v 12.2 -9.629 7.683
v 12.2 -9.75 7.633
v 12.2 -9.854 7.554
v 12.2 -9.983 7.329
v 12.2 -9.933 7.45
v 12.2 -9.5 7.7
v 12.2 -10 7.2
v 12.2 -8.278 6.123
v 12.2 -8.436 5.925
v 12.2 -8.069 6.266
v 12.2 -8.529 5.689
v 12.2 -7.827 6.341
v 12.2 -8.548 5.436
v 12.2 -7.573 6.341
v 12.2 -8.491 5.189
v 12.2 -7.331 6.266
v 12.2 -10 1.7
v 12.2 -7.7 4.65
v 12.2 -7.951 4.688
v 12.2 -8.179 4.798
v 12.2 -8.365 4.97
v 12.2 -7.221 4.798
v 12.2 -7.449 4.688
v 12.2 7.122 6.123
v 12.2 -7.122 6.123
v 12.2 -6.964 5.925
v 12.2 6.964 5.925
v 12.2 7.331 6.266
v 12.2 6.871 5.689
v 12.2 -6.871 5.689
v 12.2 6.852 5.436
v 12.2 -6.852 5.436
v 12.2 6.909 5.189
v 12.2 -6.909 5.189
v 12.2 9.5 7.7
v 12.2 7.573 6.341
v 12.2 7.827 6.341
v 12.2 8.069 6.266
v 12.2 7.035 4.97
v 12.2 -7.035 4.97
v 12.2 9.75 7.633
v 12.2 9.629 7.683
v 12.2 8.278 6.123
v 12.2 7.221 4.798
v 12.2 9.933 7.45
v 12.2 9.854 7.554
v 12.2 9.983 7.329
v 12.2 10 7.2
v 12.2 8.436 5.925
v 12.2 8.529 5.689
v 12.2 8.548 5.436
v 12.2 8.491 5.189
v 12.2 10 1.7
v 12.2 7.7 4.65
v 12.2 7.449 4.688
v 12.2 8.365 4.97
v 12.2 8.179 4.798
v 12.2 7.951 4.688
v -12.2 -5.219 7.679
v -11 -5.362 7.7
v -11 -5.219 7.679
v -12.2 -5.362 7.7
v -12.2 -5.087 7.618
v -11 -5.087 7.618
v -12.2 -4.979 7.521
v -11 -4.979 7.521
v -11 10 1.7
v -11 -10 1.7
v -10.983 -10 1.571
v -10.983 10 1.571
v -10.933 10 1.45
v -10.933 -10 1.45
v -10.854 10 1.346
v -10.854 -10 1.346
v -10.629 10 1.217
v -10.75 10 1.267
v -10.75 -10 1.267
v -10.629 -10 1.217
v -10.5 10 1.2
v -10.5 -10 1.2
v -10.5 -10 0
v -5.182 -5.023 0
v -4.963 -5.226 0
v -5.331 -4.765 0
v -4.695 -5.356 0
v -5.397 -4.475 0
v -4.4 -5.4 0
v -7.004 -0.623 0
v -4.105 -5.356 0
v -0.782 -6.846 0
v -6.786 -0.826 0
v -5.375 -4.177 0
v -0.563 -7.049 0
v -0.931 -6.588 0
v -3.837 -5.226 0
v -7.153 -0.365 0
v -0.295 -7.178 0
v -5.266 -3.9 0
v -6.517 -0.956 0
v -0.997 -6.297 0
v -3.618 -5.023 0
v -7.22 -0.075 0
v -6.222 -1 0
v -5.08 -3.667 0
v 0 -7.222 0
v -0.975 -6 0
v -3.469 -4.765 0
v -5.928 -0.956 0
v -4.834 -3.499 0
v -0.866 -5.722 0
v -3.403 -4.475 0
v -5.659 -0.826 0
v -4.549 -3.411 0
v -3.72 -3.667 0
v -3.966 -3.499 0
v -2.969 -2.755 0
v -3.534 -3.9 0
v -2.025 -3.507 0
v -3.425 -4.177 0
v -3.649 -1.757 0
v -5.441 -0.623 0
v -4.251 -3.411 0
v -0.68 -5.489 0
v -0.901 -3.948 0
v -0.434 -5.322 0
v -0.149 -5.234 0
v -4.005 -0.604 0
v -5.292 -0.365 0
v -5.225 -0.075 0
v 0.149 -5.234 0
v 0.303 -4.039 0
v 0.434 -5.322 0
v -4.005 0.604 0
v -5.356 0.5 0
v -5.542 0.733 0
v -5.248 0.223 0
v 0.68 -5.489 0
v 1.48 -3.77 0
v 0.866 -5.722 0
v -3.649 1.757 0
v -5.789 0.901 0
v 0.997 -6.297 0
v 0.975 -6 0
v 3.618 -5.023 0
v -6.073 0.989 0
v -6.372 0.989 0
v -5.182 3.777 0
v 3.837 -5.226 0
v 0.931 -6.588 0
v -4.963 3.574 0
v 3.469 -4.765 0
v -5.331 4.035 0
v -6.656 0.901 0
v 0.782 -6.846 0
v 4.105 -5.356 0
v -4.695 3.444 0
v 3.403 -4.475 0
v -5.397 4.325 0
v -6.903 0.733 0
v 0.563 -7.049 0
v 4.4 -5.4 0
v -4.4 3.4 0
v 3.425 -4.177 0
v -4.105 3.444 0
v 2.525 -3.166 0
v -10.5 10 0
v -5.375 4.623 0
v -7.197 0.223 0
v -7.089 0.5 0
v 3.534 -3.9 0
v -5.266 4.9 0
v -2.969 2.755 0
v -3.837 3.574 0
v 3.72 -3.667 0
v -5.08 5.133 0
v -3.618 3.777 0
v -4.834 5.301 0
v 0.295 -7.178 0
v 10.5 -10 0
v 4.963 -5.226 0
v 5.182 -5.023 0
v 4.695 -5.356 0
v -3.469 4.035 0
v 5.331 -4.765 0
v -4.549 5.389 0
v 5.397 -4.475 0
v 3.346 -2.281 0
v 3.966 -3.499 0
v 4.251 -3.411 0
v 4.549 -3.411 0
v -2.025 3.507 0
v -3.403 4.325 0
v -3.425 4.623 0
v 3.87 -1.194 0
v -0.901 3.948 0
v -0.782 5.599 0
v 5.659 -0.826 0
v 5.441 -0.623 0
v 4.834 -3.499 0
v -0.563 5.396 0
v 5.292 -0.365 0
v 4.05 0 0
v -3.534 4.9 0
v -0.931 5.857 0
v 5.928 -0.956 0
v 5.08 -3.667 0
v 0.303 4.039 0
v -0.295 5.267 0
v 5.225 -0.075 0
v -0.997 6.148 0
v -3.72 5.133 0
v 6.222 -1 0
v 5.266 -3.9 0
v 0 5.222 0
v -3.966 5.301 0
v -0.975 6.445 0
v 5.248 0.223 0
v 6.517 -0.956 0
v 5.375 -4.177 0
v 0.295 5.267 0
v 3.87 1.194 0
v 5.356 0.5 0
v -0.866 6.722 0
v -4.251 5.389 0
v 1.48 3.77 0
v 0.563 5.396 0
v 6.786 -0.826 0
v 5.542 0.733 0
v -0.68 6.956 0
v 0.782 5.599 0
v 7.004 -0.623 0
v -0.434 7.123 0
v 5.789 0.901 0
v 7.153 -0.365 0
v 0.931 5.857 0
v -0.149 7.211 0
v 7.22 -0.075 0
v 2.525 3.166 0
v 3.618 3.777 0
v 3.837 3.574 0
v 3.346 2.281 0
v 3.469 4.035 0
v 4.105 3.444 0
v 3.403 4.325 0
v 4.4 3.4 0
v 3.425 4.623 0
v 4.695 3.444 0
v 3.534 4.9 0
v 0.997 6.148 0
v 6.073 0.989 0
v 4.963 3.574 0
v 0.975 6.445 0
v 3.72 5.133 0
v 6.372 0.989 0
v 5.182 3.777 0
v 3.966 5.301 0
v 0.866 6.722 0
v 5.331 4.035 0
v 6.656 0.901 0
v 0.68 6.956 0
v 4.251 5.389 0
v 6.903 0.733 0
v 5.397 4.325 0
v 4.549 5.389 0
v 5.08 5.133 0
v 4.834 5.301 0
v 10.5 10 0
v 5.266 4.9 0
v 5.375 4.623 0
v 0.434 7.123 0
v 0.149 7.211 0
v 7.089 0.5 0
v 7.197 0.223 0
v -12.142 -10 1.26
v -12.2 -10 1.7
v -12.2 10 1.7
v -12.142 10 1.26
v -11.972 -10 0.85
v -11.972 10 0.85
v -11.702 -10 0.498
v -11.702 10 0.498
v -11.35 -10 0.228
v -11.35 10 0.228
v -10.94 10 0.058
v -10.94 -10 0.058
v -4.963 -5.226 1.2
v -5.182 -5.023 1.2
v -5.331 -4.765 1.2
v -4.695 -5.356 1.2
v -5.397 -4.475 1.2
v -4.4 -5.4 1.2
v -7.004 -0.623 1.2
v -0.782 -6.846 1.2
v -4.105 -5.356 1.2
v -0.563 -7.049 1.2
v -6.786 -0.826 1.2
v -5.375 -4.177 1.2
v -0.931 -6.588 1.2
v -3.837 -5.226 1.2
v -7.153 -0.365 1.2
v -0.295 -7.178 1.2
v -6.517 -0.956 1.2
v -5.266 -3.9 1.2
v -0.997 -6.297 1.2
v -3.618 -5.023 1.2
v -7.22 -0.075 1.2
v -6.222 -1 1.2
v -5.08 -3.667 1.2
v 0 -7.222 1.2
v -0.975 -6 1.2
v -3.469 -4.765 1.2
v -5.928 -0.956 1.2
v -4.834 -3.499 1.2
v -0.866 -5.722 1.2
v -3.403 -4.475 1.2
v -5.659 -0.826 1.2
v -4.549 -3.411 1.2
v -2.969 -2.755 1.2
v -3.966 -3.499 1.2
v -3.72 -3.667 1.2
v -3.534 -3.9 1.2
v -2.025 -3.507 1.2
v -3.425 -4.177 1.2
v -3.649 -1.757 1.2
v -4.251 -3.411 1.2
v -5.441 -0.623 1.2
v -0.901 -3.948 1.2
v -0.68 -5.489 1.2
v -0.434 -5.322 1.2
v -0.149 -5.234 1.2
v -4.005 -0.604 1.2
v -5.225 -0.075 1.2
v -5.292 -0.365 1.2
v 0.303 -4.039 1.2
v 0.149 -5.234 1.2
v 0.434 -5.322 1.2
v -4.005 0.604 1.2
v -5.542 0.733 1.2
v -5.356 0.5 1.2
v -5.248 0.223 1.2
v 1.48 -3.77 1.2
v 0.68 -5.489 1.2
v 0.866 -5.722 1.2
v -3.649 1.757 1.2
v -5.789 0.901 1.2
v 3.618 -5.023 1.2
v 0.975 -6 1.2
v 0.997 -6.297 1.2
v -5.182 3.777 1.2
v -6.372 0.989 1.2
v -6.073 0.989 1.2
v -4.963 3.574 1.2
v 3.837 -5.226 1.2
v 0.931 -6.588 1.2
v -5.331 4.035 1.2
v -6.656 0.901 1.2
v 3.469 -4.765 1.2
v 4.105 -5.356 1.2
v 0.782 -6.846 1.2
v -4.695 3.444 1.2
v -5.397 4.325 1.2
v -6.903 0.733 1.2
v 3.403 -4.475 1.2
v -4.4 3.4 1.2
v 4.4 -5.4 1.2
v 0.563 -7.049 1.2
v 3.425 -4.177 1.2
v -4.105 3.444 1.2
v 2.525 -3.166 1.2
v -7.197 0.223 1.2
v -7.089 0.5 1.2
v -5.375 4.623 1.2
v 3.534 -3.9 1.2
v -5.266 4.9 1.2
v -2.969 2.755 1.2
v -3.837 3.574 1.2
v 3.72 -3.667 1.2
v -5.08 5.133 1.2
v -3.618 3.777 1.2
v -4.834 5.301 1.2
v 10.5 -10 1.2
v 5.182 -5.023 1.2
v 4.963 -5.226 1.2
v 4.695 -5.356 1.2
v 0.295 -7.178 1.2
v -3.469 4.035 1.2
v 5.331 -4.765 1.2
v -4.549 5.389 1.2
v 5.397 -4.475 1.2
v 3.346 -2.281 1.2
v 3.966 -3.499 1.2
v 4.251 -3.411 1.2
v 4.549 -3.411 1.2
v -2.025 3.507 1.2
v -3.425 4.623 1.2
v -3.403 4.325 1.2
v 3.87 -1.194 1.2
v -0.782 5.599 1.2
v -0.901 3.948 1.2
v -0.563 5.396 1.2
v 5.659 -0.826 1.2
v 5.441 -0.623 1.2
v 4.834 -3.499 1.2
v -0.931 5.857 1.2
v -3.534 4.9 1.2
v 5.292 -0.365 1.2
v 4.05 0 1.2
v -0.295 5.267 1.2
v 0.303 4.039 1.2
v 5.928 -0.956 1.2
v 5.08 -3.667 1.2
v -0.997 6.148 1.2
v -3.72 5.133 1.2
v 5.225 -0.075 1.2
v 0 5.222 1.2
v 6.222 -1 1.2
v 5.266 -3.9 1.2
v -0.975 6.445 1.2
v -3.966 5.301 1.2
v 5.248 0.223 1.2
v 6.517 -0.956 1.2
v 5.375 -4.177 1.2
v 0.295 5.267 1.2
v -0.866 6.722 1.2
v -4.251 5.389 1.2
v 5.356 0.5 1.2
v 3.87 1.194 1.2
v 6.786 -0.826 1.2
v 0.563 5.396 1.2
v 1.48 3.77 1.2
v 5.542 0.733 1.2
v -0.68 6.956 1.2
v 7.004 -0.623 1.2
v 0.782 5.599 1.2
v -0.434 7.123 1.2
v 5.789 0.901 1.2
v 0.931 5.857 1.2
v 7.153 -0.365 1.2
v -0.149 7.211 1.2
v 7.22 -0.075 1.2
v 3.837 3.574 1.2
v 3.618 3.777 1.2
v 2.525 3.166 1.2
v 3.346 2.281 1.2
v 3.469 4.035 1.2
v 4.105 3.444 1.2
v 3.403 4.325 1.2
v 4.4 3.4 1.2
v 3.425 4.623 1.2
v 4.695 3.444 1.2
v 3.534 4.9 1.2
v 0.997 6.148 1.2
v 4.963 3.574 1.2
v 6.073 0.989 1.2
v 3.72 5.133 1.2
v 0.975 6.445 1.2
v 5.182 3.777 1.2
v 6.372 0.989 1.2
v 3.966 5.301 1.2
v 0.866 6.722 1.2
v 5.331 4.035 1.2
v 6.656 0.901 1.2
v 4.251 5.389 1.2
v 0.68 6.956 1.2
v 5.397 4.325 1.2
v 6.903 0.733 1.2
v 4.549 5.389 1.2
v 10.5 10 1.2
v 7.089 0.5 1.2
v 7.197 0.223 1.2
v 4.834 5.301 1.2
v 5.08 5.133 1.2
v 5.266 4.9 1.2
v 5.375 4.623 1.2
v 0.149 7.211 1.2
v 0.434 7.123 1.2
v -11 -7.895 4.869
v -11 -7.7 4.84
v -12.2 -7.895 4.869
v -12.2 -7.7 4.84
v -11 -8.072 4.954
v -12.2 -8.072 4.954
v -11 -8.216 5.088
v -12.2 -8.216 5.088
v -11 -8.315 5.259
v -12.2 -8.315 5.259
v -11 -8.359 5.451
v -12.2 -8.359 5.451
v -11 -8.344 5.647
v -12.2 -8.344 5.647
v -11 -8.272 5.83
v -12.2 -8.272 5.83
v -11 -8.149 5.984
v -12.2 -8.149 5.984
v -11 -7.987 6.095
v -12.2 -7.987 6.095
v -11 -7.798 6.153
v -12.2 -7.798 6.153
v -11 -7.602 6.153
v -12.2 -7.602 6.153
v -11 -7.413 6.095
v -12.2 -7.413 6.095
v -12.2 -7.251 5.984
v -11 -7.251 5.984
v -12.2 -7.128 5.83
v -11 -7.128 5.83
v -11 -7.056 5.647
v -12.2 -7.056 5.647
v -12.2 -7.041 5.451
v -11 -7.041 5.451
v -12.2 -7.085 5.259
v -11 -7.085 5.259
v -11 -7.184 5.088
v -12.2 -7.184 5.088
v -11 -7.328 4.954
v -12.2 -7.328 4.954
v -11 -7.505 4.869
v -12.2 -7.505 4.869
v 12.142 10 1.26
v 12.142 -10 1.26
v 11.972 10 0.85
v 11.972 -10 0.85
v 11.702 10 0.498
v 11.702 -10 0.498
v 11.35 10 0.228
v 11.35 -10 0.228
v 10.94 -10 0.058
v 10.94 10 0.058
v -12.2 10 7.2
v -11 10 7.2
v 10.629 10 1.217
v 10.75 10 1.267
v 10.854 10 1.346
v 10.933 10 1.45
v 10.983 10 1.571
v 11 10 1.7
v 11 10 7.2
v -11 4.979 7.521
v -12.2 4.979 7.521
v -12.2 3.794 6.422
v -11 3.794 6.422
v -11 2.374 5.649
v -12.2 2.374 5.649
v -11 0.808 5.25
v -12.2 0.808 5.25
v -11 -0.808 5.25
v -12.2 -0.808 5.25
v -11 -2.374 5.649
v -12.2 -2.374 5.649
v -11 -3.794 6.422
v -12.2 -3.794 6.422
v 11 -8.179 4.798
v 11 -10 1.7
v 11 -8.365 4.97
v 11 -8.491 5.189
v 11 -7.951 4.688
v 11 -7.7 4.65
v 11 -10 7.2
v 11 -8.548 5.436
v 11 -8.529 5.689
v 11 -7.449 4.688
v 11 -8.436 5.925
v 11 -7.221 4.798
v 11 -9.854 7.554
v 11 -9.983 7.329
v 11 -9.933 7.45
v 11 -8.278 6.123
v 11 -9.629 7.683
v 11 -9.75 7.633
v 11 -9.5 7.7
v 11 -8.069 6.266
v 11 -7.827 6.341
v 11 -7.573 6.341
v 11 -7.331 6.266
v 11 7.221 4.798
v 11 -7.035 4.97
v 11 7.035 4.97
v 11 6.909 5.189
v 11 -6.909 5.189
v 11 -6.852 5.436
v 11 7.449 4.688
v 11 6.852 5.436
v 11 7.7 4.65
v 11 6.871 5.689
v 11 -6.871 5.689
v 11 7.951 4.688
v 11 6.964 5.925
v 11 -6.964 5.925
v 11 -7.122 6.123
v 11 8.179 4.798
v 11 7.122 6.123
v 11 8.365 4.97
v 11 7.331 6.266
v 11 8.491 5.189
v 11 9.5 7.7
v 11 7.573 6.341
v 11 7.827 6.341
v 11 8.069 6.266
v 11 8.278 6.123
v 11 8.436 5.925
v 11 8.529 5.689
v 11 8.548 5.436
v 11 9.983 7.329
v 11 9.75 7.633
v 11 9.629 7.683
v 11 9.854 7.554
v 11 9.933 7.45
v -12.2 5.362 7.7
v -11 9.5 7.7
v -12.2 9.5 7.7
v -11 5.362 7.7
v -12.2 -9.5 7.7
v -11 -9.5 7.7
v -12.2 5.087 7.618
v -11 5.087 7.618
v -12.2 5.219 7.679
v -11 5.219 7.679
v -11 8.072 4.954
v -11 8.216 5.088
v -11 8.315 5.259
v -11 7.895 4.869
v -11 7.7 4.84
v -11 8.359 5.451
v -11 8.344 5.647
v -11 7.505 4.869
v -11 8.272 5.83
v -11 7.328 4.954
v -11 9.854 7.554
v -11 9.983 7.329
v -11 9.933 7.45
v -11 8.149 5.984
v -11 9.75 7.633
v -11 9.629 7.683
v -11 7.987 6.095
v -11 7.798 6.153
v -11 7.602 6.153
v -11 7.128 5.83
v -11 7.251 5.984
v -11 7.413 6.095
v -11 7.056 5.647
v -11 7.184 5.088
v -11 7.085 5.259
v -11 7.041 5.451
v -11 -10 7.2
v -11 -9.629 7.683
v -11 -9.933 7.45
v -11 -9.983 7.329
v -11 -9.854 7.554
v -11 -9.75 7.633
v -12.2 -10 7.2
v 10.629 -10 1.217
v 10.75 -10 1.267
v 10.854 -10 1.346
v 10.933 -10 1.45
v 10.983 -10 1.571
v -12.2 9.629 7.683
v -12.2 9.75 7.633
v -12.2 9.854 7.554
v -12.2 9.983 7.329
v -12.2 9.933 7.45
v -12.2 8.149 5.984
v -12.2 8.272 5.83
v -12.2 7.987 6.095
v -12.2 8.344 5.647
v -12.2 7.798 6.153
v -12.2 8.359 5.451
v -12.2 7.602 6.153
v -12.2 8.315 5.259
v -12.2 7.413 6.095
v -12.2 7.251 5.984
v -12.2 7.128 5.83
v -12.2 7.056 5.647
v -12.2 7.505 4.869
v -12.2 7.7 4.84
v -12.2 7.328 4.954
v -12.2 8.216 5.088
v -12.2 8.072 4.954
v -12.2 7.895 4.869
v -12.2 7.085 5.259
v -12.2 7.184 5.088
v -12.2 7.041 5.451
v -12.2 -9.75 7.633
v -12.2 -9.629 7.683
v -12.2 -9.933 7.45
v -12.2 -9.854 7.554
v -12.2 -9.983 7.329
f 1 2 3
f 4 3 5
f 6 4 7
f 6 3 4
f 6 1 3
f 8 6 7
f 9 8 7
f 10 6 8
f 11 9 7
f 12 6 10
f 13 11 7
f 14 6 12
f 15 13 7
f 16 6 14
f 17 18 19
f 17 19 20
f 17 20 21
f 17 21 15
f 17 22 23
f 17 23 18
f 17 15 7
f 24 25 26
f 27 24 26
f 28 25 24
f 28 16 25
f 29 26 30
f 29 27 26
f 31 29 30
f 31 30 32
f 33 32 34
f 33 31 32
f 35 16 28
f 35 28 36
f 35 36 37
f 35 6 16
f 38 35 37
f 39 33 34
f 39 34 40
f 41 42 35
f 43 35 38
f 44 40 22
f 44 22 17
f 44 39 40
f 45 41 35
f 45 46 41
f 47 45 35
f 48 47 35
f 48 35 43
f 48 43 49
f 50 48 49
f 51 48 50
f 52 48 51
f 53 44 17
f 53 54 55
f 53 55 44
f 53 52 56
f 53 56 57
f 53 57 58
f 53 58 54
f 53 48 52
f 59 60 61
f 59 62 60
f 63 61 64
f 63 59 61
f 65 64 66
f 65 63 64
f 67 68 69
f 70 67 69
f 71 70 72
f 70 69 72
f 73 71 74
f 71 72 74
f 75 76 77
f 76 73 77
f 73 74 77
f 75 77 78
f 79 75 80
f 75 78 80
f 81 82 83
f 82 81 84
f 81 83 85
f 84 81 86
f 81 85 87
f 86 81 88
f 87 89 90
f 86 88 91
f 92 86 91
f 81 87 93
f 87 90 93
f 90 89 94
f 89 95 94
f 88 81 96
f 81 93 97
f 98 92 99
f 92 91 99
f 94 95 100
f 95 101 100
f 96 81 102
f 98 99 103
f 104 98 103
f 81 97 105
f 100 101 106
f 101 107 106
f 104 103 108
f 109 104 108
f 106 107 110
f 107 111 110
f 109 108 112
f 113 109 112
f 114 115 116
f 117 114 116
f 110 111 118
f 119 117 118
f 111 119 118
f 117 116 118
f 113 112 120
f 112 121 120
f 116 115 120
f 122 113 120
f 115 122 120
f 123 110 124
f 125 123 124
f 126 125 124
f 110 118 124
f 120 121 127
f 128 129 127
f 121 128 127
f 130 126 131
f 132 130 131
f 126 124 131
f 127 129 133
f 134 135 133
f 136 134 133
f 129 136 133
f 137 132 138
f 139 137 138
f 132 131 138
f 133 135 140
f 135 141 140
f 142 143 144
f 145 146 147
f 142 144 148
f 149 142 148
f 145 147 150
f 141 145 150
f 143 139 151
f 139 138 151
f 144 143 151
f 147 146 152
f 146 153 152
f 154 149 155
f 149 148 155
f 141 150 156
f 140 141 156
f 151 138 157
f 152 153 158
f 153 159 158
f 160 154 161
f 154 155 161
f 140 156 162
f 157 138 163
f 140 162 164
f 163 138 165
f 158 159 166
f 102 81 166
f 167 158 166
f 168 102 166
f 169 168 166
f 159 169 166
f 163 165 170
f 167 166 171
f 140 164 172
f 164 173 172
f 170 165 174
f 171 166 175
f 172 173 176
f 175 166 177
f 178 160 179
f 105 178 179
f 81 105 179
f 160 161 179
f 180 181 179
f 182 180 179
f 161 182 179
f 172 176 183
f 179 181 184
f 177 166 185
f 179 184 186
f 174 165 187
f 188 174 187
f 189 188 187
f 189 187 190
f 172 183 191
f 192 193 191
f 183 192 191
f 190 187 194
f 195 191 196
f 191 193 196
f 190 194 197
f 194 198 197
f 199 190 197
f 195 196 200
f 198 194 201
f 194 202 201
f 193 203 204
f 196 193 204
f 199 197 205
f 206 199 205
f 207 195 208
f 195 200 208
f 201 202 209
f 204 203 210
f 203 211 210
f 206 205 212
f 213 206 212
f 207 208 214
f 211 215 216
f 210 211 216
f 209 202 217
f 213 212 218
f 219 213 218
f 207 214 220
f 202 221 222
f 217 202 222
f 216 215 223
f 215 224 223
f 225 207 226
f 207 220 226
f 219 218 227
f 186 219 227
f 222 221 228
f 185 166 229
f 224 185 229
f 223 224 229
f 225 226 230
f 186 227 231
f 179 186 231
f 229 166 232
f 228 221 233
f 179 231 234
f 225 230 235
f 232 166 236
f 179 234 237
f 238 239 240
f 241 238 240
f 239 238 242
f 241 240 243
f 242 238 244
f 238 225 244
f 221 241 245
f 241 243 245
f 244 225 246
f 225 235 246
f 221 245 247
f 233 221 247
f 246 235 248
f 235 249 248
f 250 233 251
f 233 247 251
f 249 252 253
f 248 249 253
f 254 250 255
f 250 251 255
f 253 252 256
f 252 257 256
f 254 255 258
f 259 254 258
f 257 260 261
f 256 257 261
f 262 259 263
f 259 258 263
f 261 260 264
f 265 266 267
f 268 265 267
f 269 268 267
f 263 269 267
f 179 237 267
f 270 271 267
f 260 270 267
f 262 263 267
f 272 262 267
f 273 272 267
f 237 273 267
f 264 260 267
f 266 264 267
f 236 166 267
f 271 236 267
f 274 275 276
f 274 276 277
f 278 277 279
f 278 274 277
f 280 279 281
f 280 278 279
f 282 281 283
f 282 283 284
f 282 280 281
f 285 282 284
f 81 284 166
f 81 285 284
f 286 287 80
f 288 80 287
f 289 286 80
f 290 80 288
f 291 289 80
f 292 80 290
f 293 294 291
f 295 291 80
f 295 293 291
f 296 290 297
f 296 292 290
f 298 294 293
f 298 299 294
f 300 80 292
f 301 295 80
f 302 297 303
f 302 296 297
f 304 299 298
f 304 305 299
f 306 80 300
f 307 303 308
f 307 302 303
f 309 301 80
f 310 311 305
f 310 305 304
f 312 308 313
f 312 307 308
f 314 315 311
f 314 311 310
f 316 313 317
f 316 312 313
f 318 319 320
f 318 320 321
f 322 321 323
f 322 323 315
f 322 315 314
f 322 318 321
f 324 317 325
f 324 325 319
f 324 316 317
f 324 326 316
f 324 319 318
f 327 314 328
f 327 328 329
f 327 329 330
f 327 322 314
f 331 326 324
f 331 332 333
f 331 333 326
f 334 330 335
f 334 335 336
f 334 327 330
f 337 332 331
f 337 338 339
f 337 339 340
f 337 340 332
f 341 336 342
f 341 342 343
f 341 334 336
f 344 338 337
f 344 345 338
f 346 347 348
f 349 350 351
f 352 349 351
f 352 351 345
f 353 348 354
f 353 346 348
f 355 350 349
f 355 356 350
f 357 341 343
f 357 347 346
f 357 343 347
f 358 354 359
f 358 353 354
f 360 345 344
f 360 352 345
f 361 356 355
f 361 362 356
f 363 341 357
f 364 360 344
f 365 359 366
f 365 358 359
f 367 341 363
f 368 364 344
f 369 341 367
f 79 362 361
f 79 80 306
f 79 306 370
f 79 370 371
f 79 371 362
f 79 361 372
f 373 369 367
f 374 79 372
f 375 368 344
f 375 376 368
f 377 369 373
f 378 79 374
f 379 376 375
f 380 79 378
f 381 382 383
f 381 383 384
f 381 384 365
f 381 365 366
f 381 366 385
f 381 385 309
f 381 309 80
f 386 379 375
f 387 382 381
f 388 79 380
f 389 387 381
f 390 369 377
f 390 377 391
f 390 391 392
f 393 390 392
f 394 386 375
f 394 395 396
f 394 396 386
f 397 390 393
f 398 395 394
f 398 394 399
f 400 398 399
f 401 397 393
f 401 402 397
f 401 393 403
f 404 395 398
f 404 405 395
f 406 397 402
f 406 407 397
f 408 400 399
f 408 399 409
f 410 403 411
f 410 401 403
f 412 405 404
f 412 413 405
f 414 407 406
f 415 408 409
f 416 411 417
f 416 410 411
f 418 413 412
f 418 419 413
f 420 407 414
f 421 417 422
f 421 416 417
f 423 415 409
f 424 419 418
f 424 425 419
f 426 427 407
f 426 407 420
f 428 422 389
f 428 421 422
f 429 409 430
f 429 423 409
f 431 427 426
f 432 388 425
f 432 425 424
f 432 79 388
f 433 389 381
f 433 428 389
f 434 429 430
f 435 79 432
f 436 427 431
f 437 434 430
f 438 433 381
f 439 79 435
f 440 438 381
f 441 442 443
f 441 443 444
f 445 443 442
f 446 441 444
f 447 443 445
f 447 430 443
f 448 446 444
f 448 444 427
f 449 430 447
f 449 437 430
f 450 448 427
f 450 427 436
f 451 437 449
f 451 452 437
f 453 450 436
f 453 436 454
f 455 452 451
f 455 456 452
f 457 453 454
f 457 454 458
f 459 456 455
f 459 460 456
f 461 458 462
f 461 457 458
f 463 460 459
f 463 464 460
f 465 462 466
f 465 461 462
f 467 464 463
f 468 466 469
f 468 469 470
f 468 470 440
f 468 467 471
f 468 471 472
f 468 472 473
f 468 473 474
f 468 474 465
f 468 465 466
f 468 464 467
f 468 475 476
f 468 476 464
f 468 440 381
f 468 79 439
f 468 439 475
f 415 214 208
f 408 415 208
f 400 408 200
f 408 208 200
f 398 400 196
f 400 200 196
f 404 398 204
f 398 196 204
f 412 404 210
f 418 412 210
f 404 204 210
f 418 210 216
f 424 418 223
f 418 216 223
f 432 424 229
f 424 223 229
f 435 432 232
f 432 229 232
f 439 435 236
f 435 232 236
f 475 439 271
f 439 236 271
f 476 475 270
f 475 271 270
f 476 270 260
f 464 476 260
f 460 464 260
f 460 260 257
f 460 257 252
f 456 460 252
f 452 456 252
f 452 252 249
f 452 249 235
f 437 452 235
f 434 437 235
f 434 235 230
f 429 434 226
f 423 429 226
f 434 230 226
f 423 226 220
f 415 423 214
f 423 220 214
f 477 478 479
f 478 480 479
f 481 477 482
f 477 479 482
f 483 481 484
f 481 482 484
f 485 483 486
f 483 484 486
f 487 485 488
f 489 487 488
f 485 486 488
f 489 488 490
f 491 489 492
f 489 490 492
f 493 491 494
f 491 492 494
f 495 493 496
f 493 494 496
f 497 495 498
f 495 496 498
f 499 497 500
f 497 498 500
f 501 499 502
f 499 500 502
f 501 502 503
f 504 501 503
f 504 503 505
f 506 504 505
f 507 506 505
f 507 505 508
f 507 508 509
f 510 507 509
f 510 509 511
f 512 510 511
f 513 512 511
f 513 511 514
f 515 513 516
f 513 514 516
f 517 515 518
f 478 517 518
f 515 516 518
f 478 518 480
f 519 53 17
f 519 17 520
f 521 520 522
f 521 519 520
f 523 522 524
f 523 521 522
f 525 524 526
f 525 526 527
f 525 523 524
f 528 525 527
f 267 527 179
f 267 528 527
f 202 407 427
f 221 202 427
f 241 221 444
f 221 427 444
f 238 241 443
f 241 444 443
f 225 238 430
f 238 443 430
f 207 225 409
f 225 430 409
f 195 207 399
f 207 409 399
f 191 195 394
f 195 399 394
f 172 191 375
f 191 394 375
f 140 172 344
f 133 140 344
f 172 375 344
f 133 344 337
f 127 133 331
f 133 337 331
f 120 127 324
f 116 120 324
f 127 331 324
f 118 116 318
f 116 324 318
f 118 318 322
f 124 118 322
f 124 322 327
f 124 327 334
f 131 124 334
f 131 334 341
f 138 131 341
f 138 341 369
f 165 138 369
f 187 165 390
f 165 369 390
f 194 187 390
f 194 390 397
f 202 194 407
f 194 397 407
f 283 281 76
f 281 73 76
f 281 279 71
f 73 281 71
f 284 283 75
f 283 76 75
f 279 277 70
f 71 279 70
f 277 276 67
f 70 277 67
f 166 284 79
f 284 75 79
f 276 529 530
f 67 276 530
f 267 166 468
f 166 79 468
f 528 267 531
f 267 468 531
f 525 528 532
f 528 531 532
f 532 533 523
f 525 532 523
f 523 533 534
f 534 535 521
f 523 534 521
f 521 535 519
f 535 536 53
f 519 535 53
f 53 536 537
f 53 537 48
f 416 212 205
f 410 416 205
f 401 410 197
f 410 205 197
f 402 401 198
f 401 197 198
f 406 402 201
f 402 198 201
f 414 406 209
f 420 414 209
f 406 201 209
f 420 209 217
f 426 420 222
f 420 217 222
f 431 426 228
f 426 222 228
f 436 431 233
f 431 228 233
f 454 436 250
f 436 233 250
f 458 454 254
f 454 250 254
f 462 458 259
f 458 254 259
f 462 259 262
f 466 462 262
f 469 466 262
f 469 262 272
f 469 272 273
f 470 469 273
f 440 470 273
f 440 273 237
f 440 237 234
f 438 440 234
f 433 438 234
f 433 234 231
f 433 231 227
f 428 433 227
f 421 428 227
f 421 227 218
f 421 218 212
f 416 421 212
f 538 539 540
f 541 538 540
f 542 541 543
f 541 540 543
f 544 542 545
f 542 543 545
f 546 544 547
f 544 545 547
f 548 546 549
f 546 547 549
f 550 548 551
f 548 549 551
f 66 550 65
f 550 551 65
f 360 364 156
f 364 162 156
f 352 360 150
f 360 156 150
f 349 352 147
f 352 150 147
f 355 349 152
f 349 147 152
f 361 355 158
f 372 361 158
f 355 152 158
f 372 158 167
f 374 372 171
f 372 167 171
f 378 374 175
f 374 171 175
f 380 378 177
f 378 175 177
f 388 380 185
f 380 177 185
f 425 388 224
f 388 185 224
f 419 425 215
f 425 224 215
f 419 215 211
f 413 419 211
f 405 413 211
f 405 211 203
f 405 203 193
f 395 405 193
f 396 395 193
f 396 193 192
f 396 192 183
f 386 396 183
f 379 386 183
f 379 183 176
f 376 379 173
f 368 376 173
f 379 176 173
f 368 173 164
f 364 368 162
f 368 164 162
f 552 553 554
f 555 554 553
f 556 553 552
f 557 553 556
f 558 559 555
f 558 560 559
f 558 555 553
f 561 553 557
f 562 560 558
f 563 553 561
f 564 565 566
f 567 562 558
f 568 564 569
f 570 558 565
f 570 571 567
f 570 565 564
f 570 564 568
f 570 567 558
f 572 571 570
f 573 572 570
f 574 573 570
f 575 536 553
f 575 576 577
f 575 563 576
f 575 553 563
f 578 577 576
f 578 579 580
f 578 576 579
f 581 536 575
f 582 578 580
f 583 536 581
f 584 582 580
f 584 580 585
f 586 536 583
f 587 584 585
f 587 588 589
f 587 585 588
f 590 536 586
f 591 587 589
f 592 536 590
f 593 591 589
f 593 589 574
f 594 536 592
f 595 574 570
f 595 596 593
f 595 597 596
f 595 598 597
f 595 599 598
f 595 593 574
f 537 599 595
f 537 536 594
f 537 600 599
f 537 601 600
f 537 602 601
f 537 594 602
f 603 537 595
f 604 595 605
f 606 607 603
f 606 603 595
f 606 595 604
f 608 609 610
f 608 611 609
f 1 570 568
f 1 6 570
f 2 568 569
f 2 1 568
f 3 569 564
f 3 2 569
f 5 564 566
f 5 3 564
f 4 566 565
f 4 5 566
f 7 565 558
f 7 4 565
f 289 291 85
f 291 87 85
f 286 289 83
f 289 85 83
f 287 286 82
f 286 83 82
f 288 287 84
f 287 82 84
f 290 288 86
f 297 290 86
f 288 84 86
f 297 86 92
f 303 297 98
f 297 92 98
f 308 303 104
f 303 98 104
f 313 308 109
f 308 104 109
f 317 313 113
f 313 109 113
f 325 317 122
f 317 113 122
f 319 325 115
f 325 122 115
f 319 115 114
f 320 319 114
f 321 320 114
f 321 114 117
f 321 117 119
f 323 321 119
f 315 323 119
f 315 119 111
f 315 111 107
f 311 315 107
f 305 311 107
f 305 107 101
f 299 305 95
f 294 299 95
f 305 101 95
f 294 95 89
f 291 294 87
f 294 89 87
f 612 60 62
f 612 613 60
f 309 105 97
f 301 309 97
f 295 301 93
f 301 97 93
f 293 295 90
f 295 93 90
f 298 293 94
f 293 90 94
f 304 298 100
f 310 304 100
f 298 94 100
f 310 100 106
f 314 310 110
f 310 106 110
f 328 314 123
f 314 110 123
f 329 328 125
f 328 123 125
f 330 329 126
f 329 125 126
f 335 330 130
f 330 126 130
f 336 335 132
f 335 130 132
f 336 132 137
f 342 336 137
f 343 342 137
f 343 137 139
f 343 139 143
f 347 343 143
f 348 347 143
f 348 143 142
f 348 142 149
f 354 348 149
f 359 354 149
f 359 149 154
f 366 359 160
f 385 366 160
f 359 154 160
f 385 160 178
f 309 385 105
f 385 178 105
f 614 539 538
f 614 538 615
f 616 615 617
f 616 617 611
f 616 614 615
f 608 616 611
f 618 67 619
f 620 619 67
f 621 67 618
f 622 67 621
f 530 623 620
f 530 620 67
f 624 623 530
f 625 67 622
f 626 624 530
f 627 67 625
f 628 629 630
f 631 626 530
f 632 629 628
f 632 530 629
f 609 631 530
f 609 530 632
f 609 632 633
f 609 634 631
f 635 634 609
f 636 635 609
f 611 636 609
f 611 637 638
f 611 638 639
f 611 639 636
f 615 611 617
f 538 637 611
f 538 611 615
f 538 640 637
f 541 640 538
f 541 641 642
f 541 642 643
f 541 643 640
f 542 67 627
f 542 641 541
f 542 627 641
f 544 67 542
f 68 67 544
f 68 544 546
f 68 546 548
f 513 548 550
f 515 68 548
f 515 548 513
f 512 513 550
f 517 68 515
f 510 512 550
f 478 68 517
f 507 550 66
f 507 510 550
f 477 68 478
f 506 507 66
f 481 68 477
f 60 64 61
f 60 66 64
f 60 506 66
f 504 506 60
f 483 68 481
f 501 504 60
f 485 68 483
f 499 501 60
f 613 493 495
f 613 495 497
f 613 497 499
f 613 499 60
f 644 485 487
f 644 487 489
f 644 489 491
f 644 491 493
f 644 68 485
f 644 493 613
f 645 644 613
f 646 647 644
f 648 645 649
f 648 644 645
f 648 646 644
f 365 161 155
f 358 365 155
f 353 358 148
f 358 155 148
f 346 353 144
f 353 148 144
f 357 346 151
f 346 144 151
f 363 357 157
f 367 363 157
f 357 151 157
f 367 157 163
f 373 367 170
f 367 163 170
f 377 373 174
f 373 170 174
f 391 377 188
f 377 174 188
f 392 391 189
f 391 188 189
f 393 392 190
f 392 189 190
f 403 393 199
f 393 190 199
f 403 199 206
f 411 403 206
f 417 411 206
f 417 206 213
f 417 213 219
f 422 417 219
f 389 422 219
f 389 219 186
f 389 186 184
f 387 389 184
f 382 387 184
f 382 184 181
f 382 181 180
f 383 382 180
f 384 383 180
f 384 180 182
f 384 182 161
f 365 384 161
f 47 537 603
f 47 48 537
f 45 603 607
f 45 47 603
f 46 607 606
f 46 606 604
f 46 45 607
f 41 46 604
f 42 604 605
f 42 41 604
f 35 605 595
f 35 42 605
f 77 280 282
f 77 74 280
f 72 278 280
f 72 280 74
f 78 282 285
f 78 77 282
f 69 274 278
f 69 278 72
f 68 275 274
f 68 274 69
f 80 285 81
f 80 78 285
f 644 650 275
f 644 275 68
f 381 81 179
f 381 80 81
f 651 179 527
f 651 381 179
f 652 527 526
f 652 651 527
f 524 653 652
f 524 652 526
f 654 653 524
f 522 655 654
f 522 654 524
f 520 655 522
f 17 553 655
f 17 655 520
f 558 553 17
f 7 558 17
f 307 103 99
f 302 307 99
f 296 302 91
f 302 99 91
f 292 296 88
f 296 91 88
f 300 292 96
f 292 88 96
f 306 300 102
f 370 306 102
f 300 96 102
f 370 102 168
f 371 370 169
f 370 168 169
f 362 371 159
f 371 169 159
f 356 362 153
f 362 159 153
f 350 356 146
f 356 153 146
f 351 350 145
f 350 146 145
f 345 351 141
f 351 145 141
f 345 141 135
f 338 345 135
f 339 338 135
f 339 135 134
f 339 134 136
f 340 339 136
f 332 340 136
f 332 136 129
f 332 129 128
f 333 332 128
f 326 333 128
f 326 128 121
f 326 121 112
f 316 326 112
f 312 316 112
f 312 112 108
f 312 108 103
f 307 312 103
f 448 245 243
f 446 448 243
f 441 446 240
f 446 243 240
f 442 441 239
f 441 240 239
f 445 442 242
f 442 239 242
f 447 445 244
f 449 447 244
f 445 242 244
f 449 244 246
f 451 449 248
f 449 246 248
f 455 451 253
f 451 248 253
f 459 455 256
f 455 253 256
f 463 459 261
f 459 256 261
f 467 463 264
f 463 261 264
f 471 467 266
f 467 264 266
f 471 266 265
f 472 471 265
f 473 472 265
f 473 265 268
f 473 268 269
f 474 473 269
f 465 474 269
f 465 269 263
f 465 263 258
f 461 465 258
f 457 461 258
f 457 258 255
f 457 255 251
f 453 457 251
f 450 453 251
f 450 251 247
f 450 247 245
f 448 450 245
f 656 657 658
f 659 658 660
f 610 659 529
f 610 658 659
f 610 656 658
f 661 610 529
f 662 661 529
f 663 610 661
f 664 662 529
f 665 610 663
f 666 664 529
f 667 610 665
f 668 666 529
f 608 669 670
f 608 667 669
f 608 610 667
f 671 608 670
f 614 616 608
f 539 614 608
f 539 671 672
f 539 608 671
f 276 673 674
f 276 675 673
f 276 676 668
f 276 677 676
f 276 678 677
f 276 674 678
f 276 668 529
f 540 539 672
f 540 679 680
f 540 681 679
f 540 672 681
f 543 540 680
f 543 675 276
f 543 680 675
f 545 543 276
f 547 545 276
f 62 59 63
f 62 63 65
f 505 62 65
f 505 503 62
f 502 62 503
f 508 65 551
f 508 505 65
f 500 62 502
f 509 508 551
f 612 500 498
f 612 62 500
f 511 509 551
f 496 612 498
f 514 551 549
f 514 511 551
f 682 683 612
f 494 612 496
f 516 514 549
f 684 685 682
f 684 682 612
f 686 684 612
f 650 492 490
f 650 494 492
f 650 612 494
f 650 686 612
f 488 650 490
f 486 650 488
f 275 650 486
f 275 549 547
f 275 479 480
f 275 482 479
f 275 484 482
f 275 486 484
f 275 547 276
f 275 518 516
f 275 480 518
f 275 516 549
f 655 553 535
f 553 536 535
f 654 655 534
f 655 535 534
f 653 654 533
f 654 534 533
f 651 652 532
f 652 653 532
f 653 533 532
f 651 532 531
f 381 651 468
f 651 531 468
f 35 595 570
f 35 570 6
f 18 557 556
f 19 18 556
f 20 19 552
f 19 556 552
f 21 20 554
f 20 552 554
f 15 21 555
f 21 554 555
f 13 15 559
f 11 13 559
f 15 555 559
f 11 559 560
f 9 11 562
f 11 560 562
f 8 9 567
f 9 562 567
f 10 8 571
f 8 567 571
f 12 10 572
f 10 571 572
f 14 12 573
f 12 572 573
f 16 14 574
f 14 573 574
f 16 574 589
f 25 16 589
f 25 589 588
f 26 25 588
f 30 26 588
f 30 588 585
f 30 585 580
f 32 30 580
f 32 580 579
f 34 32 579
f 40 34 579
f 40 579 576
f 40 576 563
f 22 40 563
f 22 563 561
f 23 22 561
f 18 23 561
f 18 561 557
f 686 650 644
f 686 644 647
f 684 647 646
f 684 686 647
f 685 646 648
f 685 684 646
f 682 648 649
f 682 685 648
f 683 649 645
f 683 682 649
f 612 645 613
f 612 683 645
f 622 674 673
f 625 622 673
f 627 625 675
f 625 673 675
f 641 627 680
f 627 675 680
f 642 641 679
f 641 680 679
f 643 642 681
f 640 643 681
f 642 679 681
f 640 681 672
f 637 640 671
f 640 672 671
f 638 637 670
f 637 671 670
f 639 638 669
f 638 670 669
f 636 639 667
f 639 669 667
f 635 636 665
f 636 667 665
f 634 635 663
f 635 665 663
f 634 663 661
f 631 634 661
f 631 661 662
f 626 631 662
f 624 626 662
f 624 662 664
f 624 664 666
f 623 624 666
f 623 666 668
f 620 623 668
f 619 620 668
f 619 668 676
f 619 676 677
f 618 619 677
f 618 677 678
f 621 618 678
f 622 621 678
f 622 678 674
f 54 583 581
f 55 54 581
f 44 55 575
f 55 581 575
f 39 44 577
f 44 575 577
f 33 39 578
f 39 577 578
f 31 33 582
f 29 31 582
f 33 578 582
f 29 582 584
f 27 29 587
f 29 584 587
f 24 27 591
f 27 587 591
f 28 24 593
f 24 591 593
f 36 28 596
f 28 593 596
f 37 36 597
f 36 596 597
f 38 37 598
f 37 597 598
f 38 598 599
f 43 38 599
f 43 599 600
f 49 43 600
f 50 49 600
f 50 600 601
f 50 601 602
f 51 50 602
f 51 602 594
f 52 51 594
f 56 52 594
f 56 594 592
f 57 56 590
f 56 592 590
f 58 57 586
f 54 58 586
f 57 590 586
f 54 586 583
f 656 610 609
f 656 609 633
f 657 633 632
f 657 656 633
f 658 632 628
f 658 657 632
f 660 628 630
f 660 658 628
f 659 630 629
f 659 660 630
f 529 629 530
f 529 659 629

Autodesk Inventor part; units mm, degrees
ref_plane "YZ Plane" through (0, 0, 0) normal (1, 0, 0) x (0, 1, 0)
ref_plane "XZ Plane" through (0, 0, 0) normal (0, 1, 0) x (-1, 0, 0)
ref_plane "XY Plane" through (0, 0, 0) normal (0, 0, 1) x (1, 0, 0)
sketch "スケッチ1" plane through (0, 0, 0) normal (0, 0, 1) x (1, 0, 0)
  line L0 (11, -10) -> (-11, -10)
  line L1 (-11, -10) -> (-11, 10)
  line L2 (-11, 10) -> (11, 10)
  line L3 (11, 10) -> (11, -10)
  line L4 (11, -10) -> (-11, 10) construction
  line L5 (-11, -10) -> (11, 10) construction
  point P0 (0, 0)
  dimension "d2" = 22
  dimension "d3" = 20
extrude "プレート1" add sketch "スケッチ1" along normal blind 1.2
sketch "スケッチ2" plane through (-11, -10, 1.2) normal (-1, 0, 0) x (0, -1, 0)
  line L0 (-20, 0) -> (0, 0)
  line L1 (0, 0) -> (0, 6.5)
  line L2 (0, 6.5) -> (-20, 6.5)
  line L3 (-20, 6.5) -> (-20, 0)
edge flange "フランジ1" height 7.7 angle 90 thickness 1.2 bend radius 0.5 thickness toward (-1, 0, 0) relief tear relief width 1.2 relief depth 0.6 corner gap 1.2 corner form 0 edges at (-11, 0, 1.2) (11, 0, 1.2) wall of the first edge with corners at (-11, 10, 1.2) (-11, -10, 1.2) (-11, -10, 7.7) (-11, 10, 7.7)
bend "曲げ1"
corner "コーナー1"
sketch "スケッチ3" plane through (0, 0, 1.2) normal (0, 0, 1) x (1, 0, 0)
  circle A0 centre (0, 0) radius 4.05
  dimension "d15" = 8.1
extrude "押し出し1" cut sketch "スケッチ3" against normal through all
sketch "スケッチ4" plane through (0, 0, 1.2) normal (0, 0, 1) x (1, 0, 0)
  line L0 (0, 0) -> (0, 6.2225)
  circle A0 centre (0, 6.2225) radius 0.9423
  circle A1 centre (-4.4, 4.4) radius 0.9423
  circle A2 centre (-6.2225, 0) radius 0.9423
  circle A3 centre (-4.4, -4.4) radius 0.9423
  circle A4 centre (0, -6.2225) radius 0.9423
  circle A5 centre (4.4, -4.4) radius 0.9423
  circle A6 centre (6.2225, 0) radius 0.9423
  circle A7 centre (4.4, 4.4) radius 0.9423
  dimension "d20" = 360
  dimension "d22" = 8.8
hole "穴1" at (0, 6.2225, 1.2) at (4.4, 4.4, 1.2) at (6.2225, 0, 1.2) at (4.4, -4.4, 1.2) at (0, -6.2225, 1.2) at (-4.4, -4.4, 1.2) at (-6.2225, 0, 1.2) at (-4.4, 4.4, 1.2) direction (0, 0, -1) diameter 2 end through all
sketch "スケッチ5" plane through (12.2, -10, 7.7) normal (1, 0, 0) x (0, 0, -1)
  line L0 (2.2, 2.3) -> (2.2, 17.7)
  line L1 (6.5, 9) -> (6.5, 11) projected
  line L2 (6.5, 2.7775) -> (6.5, 4.7775) projected
  line L3 (6.5, 9) -> (6.5, 11) projected
  line L4 (6.5, 15.2225) -> (6.5, 17.2225) projected
  line L5 (6.5, 13.4) -> (6.5, 15.4) projected
  line L6 (6.5, 4.6) -> (6.5, 6.6) projected
  line L7 (6.5, 4.6) -> (6.5, 6.6) projected
  line L8 (6.5, 13.4) -> (6.5, 15.4) projected
  line L9 (6.5, 5.95) -> (6.5, 14.05) projected
  line L10 (6.5, 0) -> (6.5, 20) projected
  line L11 (6.5, 20) -> (6.5, 0) projected
  line L12 (7.7, 10) -> (2.2, 10)
  dimension "d30" = 15.4
  dimension "d31" = 4.3
hole "穴2" at (12.2, 7.7, 5.5) at (12.2, -7.7, 5.5) direction (-1, 0, 0) diameter 1.321 end through all thread size "M1.7x0.35" class "6H" standard "ISO Metric profile"
sketch "スケッチ6" plane through (12.2, -10, 7.7) normal (1, 0, 0) x (0, 0, -1)
  circle A0 centre (2.2, 17.7) radius 0.6605 projected
  circle A1 centre (2.2, 2.3) radius 0.6605 projected
  line L0 (6, 0) -> (6, 20) projected
  line L1 (0, 20) -> (6, 20) projected
  line L2 (0, 0) -> (0, 20) projected
  line L3 (6, 0) -> (0, 0) projected
  point P0 (7.7, 10)
hole "穴3" at (12.2, -7.7, 5.5) at (12.2, 7.7, 5.5) direction (-1, 0, 0) diameter 1.7 depth 10 tip angle 118
sketch "スケッチ7" plane through (-12.2, -10, 7.7) normal (-1, 0, 0) x (0, 0, 1)
  circle A0 centre (-2.2, 17.7) radius 0.6605 projected
  circle A1 centre (-2.2, 2.3) radius 0.6605 projected
  line L0 (-6, 20) -> (-6, 0) projected
  line L1 (0, 0) -> (-6, 0) projected
  line L2 (0, 20) -> (0, 0) projected
  line L3 (-6, 20) -> (0, 20) projected
  line L4 (-6.5, 11) -> (-6.5, 9) projected
  line L5 (-6.5, 4.7775) -> (-6.5, 2.7775) projected
  line L6 (-6.5, 11) -> (-6.5, 9) projected
  line L7 (-6.5, 17.2225) -> (-6.5, 15.2225) projected
  line L8 (-6.5, 15.4) -> (-6.5, 13.4) projected
  line L9 (-6.5, 6.6) -> (-6.5, 4.6) projected
  line L10 (-6.5, 6.6) -> (-6.5, 4.6) projected
  line L11 (-6.5, 15.4) -> (-6.5, 13.4) projected
  line L12 (-6.5, 14.05) -> (-6.5, 5.95) projected
  line L13 (-6.5, 0) -> (-6.5, 20) projected
  line L14 (-6.5, 20) -> (-6.5, 0) projected
  line L15 (-6.5, 10) -> (4, 10)
  circle A2 centre (4, 10) radius 6.5
  point P0 (-7.7, 10)
  dimension "d46" = 10.5
  dimension "d47" = 13
extrude "押し出し2" cut sketch "スケッチ7" against normal up to surface (1.2 mm away) contours A2 L2 L15 | L15 L2 A2 | A2 L2
fillet "コーナーR1" radius 0.5 6 edges at (-11.6, -10, 7.7) (11.6, -10, 7.7) (11.6, 10, 7.7) (-11.6, 10, 7.7) (-11.6, -5.1235, 7.7) (-11.6, 5.1235, 7.7)
equation "\"d28\" = Thickness"
equation "\"d5\" = BendReliefWidth"
equation "\"d6\" = BendReliefDepth"
equation "\"d7\" = MinimumRemnant"
equation "\"d8\" = BendRadius"
equation "\"d12\" = CornerReliefSize"
equation "\"d13\" = GapSize"
equation "\"d14\" = JacobiRadiusSize"
equation "\"BendRadius\" = Thickness"
equation "\"BendReliefWidth\" = Thickness"
equation "\"BendReliefDepth\" = 0.5 * Thickness"
equation "\"CornerReliefSize\" = 4 * Thickness"
equation "\"MinimumRemnant\" = 2 * Thickness"
equation "\"TransitionRadius\" = BendRadius"
equation "\"JacobiRadiusSize\" = BendRadius"
equation "\"GapSize\" = Thickness"
equation "\"d4\" = BendRadius"
equation "\"Thickness\" = 1.2"
properties part number "G-ROBOTSアルミブラケットC" material "アルミニウム 6061"
